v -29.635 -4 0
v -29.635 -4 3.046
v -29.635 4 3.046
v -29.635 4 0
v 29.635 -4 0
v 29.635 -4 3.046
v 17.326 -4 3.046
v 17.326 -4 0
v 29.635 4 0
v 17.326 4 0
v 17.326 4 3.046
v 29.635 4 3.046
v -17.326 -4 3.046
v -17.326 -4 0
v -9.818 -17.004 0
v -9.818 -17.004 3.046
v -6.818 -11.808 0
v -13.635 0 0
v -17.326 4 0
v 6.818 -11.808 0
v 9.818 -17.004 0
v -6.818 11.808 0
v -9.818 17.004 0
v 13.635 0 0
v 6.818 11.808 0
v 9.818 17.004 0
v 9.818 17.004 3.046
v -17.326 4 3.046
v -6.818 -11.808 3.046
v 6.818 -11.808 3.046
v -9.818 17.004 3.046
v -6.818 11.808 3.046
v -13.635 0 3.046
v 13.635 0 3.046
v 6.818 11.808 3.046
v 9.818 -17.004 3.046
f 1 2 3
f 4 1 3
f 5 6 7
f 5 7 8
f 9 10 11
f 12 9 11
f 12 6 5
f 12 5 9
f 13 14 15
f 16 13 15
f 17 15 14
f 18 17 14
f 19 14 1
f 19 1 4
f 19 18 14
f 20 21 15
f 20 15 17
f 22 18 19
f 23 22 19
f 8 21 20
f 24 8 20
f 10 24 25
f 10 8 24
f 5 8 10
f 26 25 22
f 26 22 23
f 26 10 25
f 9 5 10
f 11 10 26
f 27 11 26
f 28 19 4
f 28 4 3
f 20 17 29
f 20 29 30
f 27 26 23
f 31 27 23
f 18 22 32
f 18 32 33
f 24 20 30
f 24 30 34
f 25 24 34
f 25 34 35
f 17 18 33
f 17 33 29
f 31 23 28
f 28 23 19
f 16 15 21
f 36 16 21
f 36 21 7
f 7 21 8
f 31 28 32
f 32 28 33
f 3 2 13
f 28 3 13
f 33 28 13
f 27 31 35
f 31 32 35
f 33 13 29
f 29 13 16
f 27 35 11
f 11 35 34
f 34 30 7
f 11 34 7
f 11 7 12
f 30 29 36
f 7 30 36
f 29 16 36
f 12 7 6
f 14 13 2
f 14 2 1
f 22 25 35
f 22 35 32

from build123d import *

# Parameters (mm, degrees)
PAD_DEPTH            = 10
PAD002_DEPTH         = 29.635
POCKET_DEPTH         = 0.001
POCKET_DEPTH_BACK    = -14.001
SKETCH004_W          = 82.61631
SKETCH004_H          = 35.698411
SKETCH004_W_2        = 63.407177
SKETCH004_H_2        = 4.929781
POCKET001_DEPTH      = 17.005409
POCKET001_DEPTH_BACK = -17.005409


with BuildPart() as part:
    # Sketch → Pad (new body)
    with BuildSketch(Plane.XY):
        Polygon((19.635, 0), (9.8175, 17.004409), (-9.8175, 17.004409), (-19.635, 0), (-9.8175, -17.004409), (9.8175, -17.004409), align=None)
        Polygon((13.635, 0), (6.8175, 11.808256), (-6.8175, 11.808256), (-13.635, 0), (-6.8175, -11.808256), (6.8175, -11.808256), align=None, mode=Mode.SUBTRACT)
    extrude(amount=PAD_DEPTH)

    # Sketch002 → Pad002 (join, symmetric)
    with BuildSketch(Plane.YZ):
        with BuildLine():
            ThreePointArc((4, 10), (0, 14), (-4, 10))
            Line((-4, 10), (-4, 0))
            Line((-4, 0), (4, 0))
            Line((4, 0), (4, 10))
        make_face()
    extrude(amount=PAD002_DEPTH, both=True)

    # Sketch003 → Pocket (cut, two sides)
    with BuildSketch(Plane.XY) as pocket_sk:
        Polygon((13.635, 0), (6.8175, 11.808256), (-6.8175, 11.808256), (-13.635, 0), (-6.8175, -11.808256), (6.8175, -11.808256), align=None)
    extrude(amount=-POCKET_DEPTH, mode=Mode.SUBTRACT)
    extrude(pocket_sk.sketch, amount=-POCKET_DEPTH_BACK, mode=Mode.SUBTRACT)

    # Sketch004 → Pocket001 (cut, two sides)
    with BuildSketch(Plane.XZ) as pocket001_sk:
        with Locations((0.841957, 8.089457)):
            Rectangle(SKETCH004_W, SKETCH004_H)
        with Locations((0.246989, 0.581458)):
            Rectangle(SKETCH004_W_2, SKETCH004_H_2, mode=Mode.SUBTRACT)
    extrude(amount=-POCKET001_DEPTH, mode=Mode.SUBTRACT)
    extrude(pocket001_sk.sketch, amount=-POCKET001_DEPTH_BACK, mode=Mode.SUBTRACT)


solid = part.part
